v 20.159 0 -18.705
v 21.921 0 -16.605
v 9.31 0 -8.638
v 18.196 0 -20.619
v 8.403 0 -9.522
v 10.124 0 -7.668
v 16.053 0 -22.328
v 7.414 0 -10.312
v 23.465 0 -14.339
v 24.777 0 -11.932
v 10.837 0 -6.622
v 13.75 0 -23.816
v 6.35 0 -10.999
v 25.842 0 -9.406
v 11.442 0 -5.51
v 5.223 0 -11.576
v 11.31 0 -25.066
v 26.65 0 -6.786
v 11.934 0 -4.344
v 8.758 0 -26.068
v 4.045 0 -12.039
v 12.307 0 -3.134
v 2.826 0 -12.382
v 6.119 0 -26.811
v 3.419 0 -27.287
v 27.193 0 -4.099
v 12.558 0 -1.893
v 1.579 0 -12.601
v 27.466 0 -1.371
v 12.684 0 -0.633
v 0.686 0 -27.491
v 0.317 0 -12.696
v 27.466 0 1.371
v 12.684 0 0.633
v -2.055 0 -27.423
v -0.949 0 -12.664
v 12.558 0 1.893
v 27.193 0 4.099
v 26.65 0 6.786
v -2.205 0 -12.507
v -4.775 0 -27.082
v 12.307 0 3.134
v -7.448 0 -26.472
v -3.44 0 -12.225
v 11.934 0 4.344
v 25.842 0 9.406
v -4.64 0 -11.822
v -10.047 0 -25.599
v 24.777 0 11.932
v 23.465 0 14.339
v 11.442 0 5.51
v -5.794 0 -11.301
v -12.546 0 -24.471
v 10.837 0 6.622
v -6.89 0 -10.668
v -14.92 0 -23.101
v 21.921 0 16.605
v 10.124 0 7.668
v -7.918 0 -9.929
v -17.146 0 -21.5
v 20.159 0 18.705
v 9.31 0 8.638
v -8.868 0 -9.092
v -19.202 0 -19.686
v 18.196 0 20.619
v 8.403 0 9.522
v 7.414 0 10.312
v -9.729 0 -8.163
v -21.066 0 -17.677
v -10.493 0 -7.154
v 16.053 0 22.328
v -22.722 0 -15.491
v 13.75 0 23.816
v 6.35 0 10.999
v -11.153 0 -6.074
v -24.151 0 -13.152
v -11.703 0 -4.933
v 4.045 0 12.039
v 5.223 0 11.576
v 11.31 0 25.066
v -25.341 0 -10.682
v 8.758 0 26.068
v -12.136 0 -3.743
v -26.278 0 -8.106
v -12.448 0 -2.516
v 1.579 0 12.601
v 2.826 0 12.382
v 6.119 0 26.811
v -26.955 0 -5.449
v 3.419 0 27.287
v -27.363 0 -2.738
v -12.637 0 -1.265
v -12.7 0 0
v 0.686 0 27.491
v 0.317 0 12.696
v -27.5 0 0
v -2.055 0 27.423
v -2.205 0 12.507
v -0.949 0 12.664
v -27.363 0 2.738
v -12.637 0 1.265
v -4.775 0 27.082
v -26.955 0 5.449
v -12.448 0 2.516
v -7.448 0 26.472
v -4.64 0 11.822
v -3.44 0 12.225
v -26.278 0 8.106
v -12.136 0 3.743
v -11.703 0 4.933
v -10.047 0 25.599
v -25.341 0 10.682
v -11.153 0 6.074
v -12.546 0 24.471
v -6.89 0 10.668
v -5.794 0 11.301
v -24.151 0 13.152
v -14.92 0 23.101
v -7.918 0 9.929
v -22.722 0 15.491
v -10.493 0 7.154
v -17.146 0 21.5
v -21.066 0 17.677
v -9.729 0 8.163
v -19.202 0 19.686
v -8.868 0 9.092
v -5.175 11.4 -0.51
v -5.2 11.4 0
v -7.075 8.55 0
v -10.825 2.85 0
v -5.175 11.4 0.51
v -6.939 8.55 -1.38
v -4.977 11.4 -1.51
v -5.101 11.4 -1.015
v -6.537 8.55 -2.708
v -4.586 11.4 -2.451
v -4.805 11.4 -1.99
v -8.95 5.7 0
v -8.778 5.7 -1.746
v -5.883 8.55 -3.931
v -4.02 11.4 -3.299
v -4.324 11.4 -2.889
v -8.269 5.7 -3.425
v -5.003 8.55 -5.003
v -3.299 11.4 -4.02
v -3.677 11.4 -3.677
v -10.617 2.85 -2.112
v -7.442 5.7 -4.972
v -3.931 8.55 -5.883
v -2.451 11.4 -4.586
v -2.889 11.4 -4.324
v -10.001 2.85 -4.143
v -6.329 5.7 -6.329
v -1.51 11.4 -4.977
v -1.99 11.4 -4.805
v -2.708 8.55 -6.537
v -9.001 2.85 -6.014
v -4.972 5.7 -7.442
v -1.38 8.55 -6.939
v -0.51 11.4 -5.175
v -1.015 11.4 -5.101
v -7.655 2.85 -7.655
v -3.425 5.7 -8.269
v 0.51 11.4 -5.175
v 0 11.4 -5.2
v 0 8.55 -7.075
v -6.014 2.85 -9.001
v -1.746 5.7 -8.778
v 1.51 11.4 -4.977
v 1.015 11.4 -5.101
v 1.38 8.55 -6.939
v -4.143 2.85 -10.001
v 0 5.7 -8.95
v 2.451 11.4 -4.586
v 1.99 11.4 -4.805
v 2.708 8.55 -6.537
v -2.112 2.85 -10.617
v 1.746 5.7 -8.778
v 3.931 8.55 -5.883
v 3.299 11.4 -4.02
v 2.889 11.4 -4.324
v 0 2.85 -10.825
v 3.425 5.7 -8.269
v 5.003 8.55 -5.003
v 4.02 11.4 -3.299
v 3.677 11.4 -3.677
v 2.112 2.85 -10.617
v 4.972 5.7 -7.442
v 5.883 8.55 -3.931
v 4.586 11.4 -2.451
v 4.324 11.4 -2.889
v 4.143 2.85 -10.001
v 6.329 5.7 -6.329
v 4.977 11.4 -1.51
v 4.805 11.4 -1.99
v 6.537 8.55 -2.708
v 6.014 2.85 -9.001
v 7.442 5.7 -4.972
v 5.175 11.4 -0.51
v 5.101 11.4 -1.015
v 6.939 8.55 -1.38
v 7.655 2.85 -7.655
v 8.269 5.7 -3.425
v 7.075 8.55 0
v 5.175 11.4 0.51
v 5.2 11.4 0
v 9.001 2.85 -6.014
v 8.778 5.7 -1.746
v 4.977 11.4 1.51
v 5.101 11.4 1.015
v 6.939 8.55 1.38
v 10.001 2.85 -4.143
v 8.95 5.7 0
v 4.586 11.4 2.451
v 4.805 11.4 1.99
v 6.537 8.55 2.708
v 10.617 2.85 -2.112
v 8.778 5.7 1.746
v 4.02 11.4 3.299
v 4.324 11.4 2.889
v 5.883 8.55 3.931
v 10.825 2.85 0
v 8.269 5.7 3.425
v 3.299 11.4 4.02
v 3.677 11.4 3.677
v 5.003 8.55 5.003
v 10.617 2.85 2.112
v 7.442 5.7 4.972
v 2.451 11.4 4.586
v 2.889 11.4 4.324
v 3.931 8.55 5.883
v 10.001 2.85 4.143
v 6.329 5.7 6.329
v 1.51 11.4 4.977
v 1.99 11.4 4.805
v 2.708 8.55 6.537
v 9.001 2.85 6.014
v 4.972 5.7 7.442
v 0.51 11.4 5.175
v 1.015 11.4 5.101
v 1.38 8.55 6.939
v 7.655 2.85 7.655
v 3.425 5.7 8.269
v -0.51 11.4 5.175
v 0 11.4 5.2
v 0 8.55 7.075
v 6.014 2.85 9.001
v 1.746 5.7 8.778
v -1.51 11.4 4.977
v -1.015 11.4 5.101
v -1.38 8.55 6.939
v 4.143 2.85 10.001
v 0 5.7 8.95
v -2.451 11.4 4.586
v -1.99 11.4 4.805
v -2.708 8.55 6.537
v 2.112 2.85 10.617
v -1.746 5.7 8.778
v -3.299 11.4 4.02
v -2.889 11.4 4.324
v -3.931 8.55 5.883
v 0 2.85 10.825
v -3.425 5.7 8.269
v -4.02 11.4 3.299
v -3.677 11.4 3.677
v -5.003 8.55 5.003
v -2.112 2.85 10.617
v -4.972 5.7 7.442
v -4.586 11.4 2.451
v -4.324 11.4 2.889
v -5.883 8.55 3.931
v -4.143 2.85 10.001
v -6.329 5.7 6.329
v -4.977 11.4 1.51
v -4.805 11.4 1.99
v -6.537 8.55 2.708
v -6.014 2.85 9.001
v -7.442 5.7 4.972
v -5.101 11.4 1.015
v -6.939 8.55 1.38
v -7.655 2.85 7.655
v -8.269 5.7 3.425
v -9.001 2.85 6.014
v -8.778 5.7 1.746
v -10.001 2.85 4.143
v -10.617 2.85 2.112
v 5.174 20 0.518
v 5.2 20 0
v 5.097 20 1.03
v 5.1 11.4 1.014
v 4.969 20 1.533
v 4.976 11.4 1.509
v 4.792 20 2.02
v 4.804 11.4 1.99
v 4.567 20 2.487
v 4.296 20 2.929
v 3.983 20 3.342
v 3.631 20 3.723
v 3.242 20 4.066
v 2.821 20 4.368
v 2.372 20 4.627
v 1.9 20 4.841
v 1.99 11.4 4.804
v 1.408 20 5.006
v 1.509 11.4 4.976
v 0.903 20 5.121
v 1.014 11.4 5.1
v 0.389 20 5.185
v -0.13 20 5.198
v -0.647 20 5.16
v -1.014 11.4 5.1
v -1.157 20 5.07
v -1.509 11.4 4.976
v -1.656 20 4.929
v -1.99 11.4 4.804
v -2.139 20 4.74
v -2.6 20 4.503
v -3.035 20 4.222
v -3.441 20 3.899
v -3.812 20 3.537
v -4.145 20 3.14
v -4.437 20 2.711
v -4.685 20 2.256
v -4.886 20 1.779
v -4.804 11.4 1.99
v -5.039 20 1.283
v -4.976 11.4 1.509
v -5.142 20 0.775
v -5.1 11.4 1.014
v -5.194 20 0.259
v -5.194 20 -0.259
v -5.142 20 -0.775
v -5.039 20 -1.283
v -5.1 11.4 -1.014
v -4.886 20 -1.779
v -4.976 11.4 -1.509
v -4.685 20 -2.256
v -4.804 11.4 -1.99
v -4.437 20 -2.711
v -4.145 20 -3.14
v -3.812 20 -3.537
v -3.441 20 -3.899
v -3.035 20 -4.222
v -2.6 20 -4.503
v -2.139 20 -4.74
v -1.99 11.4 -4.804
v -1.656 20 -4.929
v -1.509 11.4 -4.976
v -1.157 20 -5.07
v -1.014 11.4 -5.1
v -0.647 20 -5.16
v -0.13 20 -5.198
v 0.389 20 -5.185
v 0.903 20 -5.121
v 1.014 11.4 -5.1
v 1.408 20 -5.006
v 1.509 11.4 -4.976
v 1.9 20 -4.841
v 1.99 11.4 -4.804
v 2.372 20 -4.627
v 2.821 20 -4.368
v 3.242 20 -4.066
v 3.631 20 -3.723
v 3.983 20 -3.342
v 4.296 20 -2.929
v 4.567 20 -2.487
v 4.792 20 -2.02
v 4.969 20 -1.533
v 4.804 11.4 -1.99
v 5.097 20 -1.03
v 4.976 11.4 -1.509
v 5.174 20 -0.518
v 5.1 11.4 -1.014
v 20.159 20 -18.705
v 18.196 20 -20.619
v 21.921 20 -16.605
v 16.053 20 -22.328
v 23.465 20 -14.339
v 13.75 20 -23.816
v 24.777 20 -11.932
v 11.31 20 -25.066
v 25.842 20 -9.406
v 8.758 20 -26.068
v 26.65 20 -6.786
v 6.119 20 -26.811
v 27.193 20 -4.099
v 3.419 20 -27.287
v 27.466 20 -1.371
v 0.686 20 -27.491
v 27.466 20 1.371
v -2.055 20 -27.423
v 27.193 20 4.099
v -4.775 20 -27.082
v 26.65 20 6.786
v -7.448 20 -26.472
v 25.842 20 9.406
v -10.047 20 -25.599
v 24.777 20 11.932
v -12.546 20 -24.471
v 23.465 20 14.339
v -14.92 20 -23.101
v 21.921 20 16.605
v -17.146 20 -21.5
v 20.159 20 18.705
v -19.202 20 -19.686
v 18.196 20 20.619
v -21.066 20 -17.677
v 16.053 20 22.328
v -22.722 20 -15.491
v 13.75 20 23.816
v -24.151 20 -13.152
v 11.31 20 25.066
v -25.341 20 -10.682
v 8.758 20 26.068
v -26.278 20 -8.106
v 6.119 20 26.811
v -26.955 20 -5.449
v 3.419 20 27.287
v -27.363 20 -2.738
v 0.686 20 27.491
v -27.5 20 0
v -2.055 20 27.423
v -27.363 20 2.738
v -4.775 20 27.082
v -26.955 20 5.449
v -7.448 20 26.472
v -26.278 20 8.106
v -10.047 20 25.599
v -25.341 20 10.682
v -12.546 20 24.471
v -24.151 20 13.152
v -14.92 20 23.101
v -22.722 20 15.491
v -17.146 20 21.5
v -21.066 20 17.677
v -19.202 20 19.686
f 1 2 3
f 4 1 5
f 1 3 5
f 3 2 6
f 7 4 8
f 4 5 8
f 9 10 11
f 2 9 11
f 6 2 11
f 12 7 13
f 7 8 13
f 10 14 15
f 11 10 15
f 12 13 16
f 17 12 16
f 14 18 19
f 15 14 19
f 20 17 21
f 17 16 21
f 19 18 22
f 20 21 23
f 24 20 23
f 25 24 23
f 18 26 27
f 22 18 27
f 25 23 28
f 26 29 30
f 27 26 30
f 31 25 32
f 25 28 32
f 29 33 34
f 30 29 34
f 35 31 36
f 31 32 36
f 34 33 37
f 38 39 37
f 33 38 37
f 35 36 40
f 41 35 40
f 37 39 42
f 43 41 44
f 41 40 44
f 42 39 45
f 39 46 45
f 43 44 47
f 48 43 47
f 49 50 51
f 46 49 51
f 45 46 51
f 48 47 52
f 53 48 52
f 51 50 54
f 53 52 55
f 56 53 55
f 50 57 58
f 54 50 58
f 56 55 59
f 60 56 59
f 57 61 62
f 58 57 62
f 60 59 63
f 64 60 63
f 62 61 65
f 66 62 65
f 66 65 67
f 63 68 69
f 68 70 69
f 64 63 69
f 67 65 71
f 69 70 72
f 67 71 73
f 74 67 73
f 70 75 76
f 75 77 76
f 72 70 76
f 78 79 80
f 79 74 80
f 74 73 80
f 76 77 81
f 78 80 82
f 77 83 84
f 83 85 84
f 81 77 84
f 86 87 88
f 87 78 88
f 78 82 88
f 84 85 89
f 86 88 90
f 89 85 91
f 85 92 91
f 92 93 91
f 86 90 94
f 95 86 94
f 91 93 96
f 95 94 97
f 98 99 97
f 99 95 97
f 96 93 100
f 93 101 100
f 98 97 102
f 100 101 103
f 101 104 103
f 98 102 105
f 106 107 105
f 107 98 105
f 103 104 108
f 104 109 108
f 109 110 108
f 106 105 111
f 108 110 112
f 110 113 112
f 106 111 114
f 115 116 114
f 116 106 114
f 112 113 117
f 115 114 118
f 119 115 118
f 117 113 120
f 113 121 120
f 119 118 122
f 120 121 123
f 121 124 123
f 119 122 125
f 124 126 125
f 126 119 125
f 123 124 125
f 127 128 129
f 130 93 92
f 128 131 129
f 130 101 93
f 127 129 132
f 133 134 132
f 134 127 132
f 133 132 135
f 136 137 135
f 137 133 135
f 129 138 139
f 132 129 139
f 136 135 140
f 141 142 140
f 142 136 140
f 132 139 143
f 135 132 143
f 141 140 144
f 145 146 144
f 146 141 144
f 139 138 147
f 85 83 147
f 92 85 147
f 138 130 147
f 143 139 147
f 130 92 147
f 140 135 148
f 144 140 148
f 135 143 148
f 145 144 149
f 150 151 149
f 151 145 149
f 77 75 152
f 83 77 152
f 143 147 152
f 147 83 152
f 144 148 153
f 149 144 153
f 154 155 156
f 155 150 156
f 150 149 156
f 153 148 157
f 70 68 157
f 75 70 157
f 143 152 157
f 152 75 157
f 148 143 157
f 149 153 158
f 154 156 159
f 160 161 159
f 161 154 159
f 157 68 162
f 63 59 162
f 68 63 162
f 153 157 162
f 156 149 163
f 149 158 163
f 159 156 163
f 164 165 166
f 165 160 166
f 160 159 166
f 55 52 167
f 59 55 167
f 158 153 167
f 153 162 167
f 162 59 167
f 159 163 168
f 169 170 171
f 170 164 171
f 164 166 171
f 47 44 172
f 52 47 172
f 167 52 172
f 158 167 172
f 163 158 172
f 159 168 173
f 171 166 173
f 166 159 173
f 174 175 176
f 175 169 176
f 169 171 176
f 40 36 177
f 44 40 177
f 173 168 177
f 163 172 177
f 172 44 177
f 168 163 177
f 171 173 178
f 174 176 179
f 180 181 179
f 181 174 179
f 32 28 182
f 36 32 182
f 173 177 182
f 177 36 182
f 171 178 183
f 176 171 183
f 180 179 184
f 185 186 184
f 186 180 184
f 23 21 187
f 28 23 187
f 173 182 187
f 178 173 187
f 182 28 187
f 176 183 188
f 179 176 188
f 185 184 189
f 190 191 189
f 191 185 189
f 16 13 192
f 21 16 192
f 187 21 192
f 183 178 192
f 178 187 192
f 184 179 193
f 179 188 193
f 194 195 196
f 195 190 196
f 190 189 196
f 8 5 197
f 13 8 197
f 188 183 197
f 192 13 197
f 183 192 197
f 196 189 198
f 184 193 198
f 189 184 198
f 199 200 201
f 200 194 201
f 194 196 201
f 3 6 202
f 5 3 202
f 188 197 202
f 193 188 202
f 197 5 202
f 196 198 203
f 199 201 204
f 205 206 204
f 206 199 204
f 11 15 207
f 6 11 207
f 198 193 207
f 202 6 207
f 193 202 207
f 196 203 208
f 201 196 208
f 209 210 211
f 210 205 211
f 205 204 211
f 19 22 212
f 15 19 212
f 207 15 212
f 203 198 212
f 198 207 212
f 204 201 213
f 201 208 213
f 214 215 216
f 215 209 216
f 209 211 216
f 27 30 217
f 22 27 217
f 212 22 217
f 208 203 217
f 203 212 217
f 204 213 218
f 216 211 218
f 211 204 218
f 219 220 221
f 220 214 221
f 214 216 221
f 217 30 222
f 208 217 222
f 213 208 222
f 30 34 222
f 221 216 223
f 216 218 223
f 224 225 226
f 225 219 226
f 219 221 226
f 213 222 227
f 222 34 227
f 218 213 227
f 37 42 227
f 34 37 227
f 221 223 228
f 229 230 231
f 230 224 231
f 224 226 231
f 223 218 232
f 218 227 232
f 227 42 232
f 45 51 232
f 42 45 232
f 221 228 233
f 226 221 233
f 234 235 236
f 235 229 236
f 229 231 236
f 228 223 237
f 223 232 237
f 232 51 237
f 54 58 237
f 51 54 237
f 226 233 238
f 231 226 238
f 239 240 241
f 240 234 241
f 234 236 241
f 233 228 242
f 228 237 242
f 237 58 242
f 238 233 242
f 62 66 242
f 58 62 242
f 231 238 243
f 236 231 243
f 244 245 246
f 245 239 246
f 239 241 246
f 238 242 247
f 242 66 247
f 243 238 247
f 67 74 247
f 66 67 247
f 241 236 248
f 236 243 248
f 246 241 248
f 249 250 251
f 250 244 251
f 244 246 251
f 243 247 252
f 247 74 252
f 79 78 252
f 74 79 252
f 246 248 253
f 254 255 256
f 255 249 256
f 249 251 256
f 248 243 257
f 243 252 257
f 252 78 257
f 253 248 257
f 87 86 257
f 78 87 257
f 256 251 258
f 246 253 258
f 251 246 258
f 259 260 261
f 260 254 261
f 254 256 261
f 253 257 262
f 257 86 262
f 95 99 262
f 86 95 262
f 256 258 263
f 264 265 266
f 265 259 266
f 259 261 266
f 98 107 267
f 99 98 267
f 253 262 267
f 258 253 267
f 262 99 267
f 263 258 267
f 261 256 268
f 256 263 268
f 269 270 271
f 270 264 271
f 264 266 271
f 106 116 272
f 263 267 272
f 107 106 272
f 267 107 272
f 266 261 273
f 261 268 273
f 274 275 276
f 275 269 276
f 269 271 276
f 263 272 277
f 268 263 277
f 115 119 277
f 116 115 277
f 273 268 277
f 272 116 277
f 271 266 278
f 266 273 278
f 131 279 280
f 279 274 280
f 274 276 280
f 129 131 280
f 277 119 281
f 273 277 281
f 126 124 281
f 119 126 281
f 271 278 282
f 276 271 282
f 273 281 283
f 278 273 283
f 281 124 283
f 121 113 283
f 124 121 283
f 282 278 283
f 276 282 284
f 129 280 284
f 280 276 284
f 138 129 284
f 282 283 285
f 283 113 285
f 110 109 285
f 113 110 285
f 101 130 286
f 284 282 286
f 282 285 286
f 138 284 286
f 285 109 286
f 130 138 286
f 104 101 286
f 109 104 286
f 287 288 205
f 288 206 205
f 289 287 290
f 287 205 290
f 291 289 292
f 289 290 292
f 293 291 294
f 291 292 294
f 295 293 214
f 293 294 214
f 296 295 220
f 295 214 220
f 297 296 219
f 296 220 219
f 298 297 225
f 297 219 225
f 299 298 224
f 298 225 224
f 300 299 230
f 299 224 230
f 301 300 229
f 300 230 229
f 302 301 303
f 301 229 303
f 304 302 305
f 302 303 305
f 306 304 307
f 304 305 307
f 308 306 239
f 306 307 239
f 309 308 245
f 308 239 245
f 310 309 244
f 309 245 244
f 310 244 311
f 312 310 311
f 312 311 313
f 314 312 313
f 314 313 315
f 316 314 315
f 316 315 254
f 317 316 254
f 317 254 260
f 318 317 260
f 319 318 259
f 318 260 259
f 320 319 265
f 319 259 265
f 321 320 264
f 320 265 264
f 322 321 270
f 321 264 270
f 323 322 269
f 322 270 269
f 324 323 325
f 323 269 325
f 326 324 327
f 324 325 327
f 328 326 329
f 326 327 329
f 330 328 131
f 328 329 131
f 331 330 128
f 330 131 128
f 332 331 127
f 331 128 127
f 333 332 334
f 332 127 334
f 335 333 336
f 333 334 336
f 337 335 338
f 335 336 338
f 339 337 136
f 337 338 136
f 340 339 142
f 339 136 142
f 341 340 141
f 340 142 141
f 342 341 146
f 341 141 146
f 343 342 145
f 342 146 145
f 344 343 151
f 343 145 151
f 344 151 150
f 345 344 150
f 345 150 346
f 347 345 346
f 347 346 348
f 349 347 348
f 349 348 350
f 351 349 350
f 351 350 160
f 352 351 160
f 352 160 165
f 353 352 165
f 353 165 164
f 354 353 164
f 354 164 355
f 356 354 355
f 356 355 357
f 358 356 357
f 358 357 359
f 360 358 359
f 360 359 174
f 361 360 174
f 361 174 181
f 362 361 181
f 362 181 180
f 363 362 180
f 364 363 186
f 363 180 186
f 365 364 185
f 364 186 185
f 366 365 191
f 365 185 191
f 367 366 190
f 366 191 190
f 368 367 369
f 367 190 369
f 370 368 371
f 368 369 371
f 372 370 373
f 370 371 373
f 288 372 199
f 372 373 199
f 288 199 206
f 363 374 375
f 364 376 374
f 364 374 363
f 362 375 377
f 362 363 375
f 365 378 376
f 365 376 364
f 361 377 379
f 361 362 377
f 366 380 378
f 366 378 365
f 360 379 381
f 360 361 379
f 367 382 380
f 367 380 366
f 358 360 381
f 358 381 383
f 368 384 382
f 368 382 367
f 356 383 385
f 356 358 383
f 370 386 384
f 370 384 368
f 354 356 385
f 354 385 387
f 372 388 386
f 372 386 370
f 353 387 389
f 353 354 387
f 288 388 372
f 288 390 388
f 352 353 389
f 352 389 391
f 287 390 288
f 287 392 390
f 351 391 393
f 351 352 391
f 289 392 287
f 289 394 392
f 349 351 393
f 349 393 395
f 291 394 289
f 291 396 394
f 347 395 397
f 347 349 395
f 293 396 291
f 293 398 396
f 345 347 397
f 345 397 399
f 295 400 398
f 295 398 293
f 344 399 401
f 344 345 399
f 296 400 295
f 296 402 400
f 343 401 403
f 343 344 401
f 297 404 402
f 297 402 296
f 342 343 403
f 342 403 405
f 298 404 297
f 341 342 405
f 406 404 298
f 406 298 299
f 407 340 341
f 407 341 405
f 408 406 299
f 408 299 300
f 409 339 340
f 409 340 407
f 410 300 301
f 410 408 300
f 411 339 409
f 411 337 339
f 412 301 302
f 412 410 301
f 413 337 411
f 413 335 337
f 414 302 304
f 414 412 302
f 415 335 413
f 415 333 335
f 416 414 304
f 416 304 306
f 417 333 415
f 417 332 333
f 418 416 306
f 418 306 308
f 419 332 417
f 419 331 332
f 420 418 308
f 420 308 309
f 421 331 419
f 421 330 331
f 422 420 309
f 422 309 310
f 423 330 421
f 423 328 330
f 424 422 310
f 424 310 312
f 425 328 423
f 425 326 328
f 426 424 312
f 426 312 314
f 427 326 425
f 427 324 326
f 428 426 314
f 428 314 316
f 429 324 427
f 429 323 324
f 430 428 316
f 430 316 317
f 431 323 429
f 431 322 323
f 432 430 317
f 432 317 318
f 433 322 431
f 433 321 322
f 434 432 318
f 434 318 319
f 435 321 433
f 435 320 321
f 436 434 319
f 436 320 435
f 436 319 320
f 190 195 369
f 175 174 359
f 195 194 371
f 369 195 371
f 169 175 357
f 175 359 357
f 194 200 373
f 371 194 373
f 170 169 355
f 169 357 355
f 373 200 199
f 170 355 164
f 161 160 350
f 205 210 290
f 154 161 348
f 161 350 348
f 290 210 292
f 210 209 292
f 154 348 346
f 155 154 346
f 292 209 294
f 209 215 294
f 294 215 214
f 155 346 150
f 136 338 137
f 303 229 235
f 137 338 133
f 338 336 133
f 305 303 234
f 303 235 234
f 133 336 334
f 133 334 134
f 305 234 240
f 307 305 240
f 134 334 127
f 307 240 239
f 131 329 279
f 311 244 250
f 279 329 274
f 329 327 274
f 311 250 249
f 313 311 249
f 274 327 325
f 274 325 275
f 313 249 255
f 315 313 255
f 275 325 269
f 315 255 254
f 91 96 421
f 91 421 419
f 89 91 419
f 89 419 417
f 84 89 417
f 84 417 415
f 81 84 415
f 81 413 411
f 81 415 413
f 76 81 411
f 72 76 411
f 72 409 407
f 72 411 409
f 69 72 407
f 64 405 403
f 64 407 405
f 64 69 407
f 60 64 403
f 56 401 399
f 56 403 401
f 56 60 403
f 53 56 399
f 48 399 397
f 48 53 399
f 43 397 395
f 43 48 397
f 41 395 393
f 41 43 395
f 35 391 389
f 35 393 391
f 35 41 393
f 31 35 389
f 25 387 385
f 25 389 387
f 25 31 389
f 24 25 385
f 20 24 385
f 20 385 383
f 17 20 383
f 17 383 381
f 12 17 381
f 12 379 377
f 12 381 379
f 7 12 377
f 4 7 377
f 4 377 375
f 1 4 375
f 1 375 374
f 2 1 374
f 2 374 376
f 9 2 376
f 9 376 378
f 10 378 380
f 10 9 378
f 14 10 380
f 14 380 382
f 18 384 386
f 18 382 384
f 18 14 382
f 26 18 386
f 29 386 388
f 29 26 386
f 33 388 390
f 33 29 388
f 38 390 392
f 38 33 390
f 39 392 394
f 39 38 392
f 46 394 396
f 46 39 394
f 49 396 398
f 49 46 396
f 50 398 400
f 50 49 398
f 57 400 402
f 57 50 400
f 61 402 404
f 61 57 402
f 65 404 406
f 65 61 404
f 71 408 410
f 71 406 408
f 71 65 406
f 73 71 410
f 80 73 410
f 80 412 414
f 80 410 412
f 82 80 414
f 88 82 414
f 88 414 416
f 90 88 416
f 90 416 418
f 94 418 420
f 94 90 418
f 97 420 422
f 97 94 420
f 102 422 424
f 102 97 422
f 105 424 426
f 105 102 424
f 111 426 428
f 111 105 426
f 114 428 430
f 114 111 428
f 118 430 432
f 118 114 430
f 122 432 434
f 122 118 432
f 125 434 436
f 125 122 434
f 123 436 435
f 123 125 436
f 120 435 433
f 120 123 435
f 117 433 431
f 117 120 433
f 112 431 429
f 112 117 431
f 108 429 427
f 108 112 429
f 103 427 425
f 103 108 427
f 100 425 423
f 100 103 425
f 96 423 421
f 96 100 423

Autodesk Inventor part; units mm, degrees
ref_plane "YZ Plane" through (0, 0, 0) normal (1, 0, 0) x (0, 1, 0)
ref_plane "XZ Plane" through (0, 0, 0) normal (0, 1, 0) x (-1, 0, 0)
ref_plane "XY Plane" through (0, 0, 0) normal (0, 0, 1) x (1, 0, 0)
sketch "Sketch1" plane through (0, 0, 0) normal (0, 1, 0) x (-1, 0, 0)
  circle A0 centre (0, 0) radius 27.5
  circle A1 centre (0, 0) radius 12.7
  dimension "d1" = 55
  dimension "d14" = 25.4
extrude "Extrusion1" add sketch "Sketch1" along normal blind 20 contours A0 | A1
extrude "Extrusion2" cut sketch "Sketch1" along normal blind 11.4 contours A1
sketch "Sketch2" plane through (0, 11.4, 0) normal (0, -1, 0) x (1, 0, 0)
  circle A0 centre (0, 0) radius 5.2
  dimension "d17" = 10.4
chamfer "Chamfer2" distance 11.4 distance2 7.5 1 edges at (12.7, 11.4, 0) measured on face at (-12.5355, 7.6, -2.0372)
extrude "Extrusion3" cut sketch "Sketch2" against normal blind 11.4
properties part number "2. ring"
